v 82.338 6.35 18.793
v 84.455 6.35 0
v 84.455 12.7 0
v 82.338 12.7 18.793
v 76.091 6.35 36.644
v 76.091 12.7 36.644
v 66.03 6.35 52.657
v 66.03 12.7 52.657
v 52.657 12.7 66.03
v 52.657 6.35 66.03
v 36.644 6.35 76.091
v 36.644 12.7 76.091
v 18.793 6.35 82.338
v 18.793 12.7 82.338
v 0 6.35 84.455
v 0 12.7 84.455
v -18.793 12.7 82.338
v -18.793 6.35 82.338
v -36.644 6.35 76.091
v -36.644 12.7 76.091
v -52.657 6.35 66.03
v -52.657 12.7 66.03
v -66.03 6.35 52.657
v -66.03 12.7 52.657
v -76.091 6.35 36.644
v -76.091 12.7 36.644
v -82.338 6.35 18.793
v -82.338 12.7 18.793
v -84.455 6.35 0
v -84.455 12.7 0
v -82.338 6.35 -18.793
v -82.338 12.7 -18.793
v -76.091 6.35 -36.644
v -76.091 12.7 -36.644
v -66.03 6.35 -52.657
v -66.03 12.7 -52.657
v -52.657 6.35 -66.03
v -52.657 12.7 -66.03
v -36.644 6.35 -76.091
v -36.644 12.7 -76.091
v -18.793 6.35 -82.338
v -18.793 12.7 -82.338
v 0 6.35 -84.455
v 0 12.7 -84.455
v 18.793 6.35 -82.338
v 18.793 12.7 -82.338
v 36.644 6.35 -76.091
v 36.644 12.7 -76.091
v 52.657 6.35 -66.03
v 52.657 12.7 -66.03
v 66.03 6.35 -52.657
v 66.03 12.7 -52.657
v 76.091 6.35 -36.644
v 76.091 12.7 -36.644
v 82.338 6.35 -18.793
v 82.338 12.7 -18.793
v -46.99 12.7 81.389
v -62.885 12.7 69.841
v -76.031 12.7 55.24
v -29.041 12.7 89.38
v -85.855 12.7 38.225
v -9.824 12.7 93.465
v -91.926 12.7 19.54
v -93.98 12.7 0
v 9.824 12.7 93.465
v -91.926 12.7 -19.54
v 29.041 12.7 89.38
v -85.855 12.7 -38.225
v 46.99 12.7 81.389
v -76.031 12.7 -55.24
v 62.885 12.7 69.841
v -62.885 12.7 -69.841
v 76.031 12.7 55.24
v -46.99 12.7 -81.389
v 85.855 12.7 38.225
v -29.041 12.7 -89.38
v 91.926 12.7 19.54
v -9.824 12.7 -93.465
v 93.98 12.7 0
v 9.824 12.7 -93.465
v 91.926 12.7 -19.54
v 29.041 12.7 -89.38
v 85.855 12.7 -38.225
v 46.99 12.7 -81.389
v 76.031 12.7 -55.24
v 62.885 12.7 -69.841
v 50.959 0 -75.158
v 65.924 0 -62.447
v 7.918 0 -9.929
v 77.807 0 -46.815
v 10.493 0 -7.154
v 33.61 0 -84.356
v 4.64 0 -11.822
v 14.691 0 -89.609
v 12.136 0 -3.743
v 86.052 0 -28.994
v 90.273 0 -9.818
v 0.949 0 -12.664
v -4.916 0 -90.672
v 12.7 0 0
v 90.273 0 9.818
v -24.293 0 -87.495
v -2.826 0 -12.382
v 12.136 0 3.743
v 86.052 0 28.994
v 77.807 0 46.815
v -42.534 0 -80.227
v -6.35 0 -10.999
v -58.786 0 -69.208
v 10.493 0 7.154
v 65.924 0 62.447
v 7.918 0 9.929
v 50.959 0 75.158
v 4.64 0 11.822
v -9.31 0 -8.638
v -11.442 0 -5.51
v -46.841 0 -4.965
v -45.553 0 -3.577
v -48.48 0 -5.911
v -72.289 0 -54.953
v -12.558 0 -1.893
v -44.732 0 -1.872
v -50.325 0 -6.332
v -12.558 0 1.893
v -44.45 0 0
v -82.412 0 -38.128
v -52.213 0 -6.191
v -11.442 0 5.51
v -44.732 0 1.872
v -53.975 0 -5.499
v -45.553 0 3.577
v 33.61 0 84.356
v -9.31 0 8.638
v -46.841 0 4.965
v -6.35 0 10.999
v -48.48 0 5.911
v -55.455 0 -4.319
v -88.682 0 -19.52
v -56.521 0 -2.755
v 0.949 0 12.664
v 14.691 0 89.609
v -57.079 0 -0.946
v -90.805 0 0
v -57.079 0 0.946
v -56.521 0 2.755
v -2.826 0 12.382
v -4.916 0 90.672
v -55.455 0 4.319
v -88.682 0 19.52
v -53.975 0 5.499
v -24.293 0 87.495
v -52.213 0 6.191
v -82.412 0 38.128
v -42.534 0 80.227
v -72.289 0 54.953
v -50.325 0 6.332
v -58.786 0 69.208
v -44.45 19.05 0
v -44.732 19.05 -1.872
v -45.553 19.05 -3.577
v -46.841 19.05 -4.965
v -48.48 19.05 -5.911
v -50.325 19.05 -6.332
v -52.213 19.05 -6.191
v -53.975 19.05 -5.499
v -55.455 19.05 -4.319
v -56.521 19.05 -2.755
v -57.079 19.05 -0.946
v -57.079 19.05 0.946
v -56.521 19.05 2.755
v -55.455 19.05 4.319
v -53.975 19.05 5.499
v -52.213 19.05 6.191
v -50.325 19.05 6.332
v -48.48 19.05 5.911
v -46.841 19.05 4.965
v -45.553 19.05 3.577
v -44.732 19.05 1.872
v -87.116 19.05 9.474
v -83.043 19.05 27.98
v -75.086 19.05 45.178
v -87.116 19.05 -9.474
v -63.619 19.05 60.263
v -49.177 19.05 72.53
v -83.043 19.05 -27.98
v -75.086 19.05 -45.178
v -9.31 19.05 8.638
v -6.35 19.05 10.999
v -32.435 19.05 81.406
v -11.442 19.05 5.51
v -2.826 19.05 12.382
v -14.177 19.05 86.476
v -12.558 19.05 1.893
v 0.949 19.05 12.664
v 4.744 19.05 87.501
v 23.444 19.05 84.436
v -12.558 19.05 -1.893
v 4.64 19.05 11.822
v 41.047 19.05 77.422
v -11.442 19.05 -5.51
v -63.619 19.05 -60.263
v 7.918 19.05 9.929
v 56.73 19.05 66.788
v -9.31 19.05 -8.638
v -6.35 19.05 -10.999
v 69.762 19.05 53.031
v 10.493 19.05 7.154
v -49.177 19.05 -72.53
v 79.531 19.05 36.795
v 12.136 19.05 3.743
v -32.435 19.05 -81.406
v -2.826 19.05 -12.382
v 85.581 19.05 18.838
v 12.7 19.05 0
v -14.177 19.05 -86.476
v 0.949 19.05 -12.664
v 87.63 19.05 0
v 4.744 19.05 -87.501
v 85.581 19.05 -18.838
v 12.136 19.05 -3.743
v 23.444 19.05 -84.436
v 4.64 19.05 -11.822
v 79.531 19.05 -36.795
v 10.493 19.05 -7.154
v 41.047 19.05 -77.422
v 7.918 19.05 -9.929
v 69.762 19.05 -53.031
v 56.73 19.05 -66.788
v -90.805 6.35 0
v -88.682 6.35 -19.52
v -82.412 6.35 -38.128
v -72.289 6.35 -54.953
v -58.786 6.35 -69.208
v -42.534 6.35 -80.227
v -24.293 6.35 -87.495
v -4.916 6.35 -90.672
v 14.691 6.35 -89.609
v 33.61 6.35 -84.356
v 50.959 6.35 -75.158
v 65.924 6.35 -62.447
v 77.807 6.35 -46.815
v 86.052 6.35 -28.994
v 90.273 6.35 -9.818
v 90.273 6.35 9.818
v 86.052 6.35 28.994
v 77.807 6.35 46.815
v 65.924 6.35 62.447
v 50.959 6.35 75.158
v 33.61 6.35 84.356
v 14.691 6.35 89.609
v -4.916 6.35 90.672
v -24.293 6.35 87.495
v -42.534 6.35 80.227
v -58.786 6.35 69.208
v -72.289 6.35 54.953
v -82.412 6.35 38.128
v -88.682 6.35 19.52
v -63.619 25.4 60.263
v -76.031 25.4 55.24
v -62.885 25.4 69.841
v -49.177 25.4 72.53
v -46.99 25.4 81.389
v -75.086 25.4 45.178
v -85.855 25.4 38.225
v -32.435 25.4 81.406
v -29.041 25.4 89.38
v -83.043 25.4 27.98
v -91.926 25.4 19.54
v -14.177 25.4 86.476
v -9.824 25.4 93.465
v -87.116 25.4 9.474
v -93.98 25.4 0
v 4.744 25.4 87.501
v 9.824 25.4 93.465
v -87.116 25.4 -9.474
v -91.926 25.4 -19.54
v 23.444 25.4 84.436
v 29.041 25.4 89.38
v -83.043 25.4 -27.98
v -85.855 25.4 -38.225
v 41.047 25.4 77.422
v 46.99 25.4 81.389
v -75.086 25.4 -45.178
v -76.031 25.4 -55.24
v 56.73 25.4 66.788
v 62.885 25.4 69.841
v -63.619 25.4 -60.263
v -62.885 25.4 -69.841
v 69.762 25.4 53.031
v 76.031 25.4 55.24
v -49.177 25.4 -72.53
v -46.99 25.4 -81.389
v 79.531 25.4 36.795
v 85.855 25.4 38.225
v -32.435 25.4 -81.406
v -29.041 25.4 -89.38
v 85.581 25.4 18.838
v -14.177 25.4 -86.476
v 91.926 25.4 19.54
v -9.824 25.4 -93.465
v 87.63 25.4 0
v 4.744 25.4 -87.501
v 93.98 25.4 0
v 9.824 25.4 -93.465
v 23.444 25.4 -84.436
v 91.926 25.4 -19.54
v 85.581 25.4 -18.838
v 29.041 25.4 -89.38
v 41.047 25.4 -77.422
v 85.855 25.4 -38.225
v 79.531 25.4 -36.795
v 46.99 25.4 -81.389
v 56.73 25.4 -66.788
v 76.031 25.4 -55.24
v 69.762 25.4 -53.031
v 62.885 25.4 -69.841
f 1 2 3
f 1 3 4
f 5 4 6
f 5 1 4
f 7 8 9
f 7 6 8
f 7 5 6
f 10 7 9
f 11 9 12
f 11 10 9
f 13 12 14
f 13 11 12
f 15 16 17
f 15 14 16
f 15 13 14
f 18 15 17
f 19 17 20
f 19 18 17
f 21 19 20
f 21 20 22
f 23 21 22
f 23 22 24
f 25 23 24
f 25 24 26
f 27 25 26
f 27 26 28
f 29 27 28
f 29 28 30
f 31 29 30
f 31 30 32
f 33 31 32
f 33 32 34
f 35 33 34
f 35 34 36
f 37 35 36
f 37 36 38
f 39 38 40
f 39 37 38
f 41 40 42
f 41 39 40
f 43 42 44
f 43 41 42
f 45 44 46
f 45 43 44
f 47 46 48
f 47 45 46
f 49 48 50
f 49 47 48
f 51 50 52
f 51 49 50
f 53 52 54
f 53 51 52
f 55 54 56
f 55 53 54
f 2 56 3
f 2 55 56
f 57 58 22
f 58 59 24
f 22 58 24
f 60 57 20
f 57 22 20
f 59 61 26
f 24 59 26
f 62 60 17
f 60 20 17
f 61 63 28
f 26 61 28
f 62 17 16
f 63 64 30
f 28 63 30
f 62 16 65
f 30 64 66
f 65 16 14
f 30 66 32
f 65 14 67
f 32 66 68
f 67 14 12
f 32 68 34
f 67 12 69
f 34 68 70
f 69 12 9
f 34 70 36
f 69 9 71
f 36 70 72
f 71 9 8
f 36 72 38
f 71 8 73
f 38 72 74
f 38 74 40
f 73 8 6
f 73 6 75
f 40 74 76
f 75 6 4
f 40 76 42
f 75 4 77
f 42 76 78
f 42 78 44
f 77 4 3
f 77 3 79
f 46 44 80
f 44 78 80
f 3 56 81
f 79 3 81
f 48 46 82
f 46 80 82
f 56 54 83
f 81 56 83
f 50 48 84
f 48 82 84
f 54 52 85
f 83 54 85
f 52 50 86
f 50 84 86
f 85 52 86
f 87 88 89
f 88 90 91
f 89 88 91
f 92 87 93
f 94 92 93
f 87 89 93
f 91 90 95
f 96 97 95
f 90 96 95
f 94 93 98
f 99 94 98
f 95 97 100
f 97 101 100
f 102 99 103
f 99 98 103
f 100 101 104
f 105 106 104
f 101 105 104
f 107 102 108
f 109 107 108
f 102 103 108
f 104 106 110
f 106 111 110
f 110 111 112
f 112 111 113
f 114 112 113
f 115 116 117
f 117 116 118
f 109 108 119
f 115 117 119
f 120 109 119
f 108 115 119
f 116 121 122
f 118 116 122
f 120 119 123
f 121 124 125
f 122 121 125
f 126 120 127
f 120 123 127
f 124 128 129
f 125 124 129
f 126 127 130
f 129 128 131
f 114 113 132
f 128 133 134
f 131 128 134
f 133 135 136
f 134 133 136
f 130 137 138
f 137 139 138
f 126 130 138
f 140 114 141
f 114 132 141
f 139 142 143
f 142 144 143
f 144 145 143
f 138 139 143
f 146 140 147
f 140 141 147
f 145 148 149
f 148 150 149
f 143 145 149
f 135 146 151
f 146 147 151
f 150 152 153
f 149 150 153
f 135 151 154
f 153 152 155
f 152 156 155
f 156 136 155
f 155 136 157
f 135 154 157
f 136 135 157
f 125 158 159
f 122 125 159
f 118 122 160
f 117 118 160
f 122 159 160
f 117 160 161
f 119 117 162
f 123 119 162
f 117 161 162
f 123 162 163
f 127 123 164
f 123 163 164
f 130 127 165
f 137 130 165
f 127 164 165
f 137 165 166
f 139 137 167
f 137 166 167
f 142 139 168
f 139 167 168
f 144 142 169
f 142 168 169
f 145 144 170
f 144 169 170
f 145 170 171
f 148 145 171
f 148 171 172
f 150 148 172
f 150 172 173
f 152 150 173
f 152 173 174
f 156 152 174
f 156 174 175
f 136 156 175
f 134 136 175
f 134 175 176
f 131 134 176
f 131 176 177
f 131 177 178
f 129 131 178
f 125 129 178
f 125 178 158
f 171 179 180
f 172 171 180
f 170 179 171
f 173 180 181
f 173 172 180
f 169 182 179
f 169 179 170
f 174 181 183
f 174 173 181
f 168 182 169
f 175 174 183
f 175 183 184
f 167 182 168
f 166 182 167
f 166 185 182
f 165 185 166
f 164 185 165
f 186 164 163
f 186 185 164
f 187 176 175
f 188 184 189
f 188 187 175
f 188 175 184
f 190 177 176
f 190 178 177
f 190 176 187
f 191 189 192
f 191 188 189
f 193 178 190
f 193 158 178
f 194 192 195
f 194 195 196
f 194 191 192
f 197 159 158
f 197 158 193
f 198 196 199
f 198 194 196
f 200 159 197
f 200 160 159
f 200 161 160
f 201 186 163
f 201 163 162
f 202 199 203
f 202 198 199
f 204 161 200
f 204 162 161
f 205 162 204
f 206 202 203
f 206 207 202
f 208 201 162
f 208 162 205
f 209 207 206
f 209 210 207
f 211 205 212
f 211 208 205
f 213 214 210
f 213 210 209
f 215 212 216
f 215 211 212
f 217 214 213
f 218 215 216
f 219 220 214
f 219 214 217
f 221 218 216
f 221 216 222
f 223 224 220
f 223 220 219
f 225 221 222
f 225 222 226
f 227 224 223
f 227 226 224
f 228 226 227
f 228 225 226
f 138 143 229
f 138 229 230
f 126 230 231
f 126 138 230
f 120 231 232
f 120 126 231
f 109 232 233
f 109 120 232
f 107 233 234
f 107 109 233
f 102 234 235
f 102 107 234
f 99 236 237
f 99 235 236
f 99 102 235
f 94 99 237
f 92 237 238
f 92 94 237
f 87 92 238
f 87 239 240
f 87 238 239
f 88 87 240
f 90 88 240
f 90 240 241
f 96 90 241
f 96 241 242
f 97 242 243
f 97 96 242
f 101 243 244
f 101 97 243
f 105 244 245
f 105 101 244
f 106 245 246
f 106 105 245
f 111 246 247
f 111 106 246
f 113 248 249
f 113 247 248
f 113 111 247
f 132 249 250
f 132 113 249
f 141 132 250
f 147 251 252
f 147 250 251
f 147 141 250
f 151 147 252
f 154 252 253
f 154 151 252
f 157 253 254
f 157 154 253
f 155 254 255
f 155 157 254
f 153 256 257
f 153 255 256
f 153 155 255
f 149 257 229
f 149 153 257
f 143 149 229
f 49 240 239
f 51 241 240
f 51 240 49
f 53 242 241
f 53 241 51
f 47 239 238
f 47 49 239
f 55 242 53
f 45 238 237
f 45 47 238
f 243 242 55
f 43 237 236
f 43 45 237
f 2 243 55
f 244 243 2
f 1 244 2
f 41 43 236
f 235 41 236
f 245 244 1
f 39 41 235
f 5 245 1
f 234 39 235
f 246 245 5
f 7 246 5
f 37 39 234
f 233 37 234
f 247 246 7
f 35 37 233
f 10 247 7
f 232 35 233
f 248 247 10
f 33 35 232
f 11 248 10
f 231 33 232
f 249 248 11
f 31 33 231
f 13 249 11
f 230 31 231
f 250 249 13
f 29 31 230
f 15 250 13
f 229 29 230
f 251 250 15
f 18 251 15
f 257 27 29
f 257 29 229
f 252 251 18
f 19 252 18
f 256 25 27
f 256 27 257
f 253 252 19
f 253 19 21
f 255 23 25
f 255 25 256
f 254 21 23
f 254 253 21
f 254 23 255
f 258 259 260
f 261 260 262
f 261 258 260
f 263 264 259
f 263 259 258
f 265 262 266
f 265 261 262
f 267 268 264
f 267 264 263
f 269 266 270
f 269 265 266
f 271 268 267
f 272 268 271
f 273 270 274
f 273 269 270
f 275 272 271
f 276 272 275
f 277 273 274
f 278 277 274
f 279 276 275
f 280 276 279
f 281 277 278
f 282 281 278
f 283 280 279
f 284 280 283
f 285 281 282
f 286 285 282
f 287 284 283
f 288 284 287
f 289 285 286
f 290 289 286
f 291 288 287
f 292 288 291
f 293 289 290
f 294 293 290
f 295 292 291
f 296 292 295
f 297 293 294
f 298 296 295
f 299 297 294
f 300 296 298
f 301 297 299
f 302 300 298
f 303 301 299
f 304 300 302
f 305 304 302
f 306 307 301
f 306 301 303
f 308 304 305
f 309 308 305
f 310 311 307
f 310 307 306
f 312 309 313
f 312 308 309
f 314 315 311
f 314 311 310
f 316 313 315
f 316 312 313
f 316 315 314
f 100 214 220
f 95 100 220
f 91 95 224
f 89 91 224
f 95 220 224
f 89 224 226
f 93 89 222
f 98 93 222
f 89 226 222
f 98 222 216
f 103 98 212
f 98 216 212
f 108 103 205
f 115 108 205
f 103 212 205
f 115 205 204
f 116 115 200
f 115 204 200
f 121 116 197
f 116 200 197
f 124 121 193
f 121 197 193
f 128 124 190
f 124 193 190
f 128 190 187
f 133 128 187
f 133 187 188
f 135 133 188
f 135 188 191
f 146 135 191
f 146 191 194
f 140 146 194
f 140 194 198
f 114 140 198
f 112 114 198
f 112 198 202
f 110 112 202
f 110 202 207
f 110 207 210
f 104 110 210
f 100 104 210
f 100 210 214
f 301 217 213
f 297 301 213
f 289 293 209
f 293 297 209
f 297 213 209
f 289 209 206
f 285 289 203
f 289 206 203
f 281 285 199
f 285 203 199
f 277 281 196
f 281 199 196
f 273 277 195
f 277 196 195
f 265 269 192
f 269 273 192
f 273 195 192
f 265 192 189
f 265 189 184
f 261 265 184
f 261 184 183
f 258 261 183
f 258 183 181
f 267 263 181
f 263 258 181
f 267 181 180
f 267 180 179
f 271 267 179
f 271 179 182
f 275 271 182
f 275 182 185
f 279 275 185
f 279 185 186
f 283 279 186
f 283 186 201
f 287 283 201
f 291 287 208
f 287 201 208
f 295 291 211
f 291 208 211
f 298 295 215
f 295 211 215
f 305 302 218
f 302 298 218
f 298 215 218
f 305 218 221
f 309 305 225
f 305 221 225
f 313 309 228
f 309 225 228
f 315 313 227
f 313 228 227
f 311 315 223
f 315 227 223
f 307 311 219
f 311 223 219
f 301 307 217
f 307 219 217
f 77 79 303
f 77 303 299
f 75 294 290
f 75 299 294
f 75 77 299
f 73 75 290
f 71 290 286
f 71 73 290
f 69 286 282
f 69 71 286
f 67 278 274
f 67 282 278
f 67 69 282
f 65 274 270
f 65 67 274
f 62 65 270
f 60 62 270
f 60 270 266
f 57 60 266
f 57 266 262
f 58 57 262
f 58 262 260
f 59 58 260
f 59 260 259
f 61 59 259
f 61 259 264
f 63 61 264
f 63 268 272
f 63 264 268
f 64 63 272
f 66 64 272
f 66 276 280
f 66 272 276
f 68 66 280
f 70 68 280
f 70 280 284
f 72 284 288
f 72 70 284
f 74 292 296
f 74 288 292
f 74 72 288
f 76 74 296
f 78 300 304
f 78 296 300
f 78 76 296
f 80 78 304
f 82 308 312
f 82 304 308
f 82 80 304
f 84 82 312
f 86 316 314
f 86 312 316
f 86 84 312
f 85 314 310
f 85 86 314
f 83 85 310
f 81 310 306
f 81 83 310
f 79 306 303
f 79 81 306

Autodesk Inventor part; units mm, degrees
ref_plane "YZ Plane" through (0, 0, 0) normal (1, 0, 0) x (0, 1, 0)
ref_plane "XZ Plane" through (0, 0, 0) normal (0, 1, 0) x (-1, 0, 0)
ref_plane "XY Plane" through (0, 0, 0) normal (0, 0, 1) x (1, 0, 0)
sketch "Sketch1" plane through (0, 0, 0) normal (0, 1, 0) x (-1, 0, 0)
  circle A0 centre (0, 0) radius 90.805
  dimension "d0" = 181.61
extrude "Extrusion1" add sketch "Sketch1" along normal blind 6.35
sketch "Sketch2" plane through (0, 6.35, 0) normal (0, 1, 0) x (1, 0, 0)
  circle A0 centre (0, 0) radius 84.455
  dimension "d3" = 168.91
extrude "Extrusion2" add sketch "Sketch2" along normal blind 6.35
sketch "Sketch3" plane through (0, 12.7, 0) normal (0, 1, 0) x (1, 0, 0)
  circle A0 centre (0, 0) radius 93.98
  dimension "d6" = 187.96
extrude "Extrusion3" add sketch "Sketch3" along normal blind 6.35
sketch "Sketch4" plane through (0, 19.05, 0) normal (0, 1, 0) x (1, 0, 0)
  circle A0 centre (0, 0) radius 12.7
  circle A1 centre (-50.8, 0) radius 6.35
  dimension "d9" = 25.4
  dimension "d10" = 50.8
  dimension "d11" = 12.7
extrude "Extrusion4" cut sketch "Sketch4" against normal up to next
sketch "Sketch5" plane through (0, 19.05, 0) normal (0, 1, 0) x (1, 0, 0)
  circle A0 centre (0, 0) radius 93.98
  circle A1 centre (0, 0) radius 87.63
  dimension "d14" = 187.96
  dimension "d15" = 175.26
extrude "Extrusion5" add sketch "Sketch5" along normal blind 6.35
properties part number "thermal_barrier" material "Phenolic Resin"
